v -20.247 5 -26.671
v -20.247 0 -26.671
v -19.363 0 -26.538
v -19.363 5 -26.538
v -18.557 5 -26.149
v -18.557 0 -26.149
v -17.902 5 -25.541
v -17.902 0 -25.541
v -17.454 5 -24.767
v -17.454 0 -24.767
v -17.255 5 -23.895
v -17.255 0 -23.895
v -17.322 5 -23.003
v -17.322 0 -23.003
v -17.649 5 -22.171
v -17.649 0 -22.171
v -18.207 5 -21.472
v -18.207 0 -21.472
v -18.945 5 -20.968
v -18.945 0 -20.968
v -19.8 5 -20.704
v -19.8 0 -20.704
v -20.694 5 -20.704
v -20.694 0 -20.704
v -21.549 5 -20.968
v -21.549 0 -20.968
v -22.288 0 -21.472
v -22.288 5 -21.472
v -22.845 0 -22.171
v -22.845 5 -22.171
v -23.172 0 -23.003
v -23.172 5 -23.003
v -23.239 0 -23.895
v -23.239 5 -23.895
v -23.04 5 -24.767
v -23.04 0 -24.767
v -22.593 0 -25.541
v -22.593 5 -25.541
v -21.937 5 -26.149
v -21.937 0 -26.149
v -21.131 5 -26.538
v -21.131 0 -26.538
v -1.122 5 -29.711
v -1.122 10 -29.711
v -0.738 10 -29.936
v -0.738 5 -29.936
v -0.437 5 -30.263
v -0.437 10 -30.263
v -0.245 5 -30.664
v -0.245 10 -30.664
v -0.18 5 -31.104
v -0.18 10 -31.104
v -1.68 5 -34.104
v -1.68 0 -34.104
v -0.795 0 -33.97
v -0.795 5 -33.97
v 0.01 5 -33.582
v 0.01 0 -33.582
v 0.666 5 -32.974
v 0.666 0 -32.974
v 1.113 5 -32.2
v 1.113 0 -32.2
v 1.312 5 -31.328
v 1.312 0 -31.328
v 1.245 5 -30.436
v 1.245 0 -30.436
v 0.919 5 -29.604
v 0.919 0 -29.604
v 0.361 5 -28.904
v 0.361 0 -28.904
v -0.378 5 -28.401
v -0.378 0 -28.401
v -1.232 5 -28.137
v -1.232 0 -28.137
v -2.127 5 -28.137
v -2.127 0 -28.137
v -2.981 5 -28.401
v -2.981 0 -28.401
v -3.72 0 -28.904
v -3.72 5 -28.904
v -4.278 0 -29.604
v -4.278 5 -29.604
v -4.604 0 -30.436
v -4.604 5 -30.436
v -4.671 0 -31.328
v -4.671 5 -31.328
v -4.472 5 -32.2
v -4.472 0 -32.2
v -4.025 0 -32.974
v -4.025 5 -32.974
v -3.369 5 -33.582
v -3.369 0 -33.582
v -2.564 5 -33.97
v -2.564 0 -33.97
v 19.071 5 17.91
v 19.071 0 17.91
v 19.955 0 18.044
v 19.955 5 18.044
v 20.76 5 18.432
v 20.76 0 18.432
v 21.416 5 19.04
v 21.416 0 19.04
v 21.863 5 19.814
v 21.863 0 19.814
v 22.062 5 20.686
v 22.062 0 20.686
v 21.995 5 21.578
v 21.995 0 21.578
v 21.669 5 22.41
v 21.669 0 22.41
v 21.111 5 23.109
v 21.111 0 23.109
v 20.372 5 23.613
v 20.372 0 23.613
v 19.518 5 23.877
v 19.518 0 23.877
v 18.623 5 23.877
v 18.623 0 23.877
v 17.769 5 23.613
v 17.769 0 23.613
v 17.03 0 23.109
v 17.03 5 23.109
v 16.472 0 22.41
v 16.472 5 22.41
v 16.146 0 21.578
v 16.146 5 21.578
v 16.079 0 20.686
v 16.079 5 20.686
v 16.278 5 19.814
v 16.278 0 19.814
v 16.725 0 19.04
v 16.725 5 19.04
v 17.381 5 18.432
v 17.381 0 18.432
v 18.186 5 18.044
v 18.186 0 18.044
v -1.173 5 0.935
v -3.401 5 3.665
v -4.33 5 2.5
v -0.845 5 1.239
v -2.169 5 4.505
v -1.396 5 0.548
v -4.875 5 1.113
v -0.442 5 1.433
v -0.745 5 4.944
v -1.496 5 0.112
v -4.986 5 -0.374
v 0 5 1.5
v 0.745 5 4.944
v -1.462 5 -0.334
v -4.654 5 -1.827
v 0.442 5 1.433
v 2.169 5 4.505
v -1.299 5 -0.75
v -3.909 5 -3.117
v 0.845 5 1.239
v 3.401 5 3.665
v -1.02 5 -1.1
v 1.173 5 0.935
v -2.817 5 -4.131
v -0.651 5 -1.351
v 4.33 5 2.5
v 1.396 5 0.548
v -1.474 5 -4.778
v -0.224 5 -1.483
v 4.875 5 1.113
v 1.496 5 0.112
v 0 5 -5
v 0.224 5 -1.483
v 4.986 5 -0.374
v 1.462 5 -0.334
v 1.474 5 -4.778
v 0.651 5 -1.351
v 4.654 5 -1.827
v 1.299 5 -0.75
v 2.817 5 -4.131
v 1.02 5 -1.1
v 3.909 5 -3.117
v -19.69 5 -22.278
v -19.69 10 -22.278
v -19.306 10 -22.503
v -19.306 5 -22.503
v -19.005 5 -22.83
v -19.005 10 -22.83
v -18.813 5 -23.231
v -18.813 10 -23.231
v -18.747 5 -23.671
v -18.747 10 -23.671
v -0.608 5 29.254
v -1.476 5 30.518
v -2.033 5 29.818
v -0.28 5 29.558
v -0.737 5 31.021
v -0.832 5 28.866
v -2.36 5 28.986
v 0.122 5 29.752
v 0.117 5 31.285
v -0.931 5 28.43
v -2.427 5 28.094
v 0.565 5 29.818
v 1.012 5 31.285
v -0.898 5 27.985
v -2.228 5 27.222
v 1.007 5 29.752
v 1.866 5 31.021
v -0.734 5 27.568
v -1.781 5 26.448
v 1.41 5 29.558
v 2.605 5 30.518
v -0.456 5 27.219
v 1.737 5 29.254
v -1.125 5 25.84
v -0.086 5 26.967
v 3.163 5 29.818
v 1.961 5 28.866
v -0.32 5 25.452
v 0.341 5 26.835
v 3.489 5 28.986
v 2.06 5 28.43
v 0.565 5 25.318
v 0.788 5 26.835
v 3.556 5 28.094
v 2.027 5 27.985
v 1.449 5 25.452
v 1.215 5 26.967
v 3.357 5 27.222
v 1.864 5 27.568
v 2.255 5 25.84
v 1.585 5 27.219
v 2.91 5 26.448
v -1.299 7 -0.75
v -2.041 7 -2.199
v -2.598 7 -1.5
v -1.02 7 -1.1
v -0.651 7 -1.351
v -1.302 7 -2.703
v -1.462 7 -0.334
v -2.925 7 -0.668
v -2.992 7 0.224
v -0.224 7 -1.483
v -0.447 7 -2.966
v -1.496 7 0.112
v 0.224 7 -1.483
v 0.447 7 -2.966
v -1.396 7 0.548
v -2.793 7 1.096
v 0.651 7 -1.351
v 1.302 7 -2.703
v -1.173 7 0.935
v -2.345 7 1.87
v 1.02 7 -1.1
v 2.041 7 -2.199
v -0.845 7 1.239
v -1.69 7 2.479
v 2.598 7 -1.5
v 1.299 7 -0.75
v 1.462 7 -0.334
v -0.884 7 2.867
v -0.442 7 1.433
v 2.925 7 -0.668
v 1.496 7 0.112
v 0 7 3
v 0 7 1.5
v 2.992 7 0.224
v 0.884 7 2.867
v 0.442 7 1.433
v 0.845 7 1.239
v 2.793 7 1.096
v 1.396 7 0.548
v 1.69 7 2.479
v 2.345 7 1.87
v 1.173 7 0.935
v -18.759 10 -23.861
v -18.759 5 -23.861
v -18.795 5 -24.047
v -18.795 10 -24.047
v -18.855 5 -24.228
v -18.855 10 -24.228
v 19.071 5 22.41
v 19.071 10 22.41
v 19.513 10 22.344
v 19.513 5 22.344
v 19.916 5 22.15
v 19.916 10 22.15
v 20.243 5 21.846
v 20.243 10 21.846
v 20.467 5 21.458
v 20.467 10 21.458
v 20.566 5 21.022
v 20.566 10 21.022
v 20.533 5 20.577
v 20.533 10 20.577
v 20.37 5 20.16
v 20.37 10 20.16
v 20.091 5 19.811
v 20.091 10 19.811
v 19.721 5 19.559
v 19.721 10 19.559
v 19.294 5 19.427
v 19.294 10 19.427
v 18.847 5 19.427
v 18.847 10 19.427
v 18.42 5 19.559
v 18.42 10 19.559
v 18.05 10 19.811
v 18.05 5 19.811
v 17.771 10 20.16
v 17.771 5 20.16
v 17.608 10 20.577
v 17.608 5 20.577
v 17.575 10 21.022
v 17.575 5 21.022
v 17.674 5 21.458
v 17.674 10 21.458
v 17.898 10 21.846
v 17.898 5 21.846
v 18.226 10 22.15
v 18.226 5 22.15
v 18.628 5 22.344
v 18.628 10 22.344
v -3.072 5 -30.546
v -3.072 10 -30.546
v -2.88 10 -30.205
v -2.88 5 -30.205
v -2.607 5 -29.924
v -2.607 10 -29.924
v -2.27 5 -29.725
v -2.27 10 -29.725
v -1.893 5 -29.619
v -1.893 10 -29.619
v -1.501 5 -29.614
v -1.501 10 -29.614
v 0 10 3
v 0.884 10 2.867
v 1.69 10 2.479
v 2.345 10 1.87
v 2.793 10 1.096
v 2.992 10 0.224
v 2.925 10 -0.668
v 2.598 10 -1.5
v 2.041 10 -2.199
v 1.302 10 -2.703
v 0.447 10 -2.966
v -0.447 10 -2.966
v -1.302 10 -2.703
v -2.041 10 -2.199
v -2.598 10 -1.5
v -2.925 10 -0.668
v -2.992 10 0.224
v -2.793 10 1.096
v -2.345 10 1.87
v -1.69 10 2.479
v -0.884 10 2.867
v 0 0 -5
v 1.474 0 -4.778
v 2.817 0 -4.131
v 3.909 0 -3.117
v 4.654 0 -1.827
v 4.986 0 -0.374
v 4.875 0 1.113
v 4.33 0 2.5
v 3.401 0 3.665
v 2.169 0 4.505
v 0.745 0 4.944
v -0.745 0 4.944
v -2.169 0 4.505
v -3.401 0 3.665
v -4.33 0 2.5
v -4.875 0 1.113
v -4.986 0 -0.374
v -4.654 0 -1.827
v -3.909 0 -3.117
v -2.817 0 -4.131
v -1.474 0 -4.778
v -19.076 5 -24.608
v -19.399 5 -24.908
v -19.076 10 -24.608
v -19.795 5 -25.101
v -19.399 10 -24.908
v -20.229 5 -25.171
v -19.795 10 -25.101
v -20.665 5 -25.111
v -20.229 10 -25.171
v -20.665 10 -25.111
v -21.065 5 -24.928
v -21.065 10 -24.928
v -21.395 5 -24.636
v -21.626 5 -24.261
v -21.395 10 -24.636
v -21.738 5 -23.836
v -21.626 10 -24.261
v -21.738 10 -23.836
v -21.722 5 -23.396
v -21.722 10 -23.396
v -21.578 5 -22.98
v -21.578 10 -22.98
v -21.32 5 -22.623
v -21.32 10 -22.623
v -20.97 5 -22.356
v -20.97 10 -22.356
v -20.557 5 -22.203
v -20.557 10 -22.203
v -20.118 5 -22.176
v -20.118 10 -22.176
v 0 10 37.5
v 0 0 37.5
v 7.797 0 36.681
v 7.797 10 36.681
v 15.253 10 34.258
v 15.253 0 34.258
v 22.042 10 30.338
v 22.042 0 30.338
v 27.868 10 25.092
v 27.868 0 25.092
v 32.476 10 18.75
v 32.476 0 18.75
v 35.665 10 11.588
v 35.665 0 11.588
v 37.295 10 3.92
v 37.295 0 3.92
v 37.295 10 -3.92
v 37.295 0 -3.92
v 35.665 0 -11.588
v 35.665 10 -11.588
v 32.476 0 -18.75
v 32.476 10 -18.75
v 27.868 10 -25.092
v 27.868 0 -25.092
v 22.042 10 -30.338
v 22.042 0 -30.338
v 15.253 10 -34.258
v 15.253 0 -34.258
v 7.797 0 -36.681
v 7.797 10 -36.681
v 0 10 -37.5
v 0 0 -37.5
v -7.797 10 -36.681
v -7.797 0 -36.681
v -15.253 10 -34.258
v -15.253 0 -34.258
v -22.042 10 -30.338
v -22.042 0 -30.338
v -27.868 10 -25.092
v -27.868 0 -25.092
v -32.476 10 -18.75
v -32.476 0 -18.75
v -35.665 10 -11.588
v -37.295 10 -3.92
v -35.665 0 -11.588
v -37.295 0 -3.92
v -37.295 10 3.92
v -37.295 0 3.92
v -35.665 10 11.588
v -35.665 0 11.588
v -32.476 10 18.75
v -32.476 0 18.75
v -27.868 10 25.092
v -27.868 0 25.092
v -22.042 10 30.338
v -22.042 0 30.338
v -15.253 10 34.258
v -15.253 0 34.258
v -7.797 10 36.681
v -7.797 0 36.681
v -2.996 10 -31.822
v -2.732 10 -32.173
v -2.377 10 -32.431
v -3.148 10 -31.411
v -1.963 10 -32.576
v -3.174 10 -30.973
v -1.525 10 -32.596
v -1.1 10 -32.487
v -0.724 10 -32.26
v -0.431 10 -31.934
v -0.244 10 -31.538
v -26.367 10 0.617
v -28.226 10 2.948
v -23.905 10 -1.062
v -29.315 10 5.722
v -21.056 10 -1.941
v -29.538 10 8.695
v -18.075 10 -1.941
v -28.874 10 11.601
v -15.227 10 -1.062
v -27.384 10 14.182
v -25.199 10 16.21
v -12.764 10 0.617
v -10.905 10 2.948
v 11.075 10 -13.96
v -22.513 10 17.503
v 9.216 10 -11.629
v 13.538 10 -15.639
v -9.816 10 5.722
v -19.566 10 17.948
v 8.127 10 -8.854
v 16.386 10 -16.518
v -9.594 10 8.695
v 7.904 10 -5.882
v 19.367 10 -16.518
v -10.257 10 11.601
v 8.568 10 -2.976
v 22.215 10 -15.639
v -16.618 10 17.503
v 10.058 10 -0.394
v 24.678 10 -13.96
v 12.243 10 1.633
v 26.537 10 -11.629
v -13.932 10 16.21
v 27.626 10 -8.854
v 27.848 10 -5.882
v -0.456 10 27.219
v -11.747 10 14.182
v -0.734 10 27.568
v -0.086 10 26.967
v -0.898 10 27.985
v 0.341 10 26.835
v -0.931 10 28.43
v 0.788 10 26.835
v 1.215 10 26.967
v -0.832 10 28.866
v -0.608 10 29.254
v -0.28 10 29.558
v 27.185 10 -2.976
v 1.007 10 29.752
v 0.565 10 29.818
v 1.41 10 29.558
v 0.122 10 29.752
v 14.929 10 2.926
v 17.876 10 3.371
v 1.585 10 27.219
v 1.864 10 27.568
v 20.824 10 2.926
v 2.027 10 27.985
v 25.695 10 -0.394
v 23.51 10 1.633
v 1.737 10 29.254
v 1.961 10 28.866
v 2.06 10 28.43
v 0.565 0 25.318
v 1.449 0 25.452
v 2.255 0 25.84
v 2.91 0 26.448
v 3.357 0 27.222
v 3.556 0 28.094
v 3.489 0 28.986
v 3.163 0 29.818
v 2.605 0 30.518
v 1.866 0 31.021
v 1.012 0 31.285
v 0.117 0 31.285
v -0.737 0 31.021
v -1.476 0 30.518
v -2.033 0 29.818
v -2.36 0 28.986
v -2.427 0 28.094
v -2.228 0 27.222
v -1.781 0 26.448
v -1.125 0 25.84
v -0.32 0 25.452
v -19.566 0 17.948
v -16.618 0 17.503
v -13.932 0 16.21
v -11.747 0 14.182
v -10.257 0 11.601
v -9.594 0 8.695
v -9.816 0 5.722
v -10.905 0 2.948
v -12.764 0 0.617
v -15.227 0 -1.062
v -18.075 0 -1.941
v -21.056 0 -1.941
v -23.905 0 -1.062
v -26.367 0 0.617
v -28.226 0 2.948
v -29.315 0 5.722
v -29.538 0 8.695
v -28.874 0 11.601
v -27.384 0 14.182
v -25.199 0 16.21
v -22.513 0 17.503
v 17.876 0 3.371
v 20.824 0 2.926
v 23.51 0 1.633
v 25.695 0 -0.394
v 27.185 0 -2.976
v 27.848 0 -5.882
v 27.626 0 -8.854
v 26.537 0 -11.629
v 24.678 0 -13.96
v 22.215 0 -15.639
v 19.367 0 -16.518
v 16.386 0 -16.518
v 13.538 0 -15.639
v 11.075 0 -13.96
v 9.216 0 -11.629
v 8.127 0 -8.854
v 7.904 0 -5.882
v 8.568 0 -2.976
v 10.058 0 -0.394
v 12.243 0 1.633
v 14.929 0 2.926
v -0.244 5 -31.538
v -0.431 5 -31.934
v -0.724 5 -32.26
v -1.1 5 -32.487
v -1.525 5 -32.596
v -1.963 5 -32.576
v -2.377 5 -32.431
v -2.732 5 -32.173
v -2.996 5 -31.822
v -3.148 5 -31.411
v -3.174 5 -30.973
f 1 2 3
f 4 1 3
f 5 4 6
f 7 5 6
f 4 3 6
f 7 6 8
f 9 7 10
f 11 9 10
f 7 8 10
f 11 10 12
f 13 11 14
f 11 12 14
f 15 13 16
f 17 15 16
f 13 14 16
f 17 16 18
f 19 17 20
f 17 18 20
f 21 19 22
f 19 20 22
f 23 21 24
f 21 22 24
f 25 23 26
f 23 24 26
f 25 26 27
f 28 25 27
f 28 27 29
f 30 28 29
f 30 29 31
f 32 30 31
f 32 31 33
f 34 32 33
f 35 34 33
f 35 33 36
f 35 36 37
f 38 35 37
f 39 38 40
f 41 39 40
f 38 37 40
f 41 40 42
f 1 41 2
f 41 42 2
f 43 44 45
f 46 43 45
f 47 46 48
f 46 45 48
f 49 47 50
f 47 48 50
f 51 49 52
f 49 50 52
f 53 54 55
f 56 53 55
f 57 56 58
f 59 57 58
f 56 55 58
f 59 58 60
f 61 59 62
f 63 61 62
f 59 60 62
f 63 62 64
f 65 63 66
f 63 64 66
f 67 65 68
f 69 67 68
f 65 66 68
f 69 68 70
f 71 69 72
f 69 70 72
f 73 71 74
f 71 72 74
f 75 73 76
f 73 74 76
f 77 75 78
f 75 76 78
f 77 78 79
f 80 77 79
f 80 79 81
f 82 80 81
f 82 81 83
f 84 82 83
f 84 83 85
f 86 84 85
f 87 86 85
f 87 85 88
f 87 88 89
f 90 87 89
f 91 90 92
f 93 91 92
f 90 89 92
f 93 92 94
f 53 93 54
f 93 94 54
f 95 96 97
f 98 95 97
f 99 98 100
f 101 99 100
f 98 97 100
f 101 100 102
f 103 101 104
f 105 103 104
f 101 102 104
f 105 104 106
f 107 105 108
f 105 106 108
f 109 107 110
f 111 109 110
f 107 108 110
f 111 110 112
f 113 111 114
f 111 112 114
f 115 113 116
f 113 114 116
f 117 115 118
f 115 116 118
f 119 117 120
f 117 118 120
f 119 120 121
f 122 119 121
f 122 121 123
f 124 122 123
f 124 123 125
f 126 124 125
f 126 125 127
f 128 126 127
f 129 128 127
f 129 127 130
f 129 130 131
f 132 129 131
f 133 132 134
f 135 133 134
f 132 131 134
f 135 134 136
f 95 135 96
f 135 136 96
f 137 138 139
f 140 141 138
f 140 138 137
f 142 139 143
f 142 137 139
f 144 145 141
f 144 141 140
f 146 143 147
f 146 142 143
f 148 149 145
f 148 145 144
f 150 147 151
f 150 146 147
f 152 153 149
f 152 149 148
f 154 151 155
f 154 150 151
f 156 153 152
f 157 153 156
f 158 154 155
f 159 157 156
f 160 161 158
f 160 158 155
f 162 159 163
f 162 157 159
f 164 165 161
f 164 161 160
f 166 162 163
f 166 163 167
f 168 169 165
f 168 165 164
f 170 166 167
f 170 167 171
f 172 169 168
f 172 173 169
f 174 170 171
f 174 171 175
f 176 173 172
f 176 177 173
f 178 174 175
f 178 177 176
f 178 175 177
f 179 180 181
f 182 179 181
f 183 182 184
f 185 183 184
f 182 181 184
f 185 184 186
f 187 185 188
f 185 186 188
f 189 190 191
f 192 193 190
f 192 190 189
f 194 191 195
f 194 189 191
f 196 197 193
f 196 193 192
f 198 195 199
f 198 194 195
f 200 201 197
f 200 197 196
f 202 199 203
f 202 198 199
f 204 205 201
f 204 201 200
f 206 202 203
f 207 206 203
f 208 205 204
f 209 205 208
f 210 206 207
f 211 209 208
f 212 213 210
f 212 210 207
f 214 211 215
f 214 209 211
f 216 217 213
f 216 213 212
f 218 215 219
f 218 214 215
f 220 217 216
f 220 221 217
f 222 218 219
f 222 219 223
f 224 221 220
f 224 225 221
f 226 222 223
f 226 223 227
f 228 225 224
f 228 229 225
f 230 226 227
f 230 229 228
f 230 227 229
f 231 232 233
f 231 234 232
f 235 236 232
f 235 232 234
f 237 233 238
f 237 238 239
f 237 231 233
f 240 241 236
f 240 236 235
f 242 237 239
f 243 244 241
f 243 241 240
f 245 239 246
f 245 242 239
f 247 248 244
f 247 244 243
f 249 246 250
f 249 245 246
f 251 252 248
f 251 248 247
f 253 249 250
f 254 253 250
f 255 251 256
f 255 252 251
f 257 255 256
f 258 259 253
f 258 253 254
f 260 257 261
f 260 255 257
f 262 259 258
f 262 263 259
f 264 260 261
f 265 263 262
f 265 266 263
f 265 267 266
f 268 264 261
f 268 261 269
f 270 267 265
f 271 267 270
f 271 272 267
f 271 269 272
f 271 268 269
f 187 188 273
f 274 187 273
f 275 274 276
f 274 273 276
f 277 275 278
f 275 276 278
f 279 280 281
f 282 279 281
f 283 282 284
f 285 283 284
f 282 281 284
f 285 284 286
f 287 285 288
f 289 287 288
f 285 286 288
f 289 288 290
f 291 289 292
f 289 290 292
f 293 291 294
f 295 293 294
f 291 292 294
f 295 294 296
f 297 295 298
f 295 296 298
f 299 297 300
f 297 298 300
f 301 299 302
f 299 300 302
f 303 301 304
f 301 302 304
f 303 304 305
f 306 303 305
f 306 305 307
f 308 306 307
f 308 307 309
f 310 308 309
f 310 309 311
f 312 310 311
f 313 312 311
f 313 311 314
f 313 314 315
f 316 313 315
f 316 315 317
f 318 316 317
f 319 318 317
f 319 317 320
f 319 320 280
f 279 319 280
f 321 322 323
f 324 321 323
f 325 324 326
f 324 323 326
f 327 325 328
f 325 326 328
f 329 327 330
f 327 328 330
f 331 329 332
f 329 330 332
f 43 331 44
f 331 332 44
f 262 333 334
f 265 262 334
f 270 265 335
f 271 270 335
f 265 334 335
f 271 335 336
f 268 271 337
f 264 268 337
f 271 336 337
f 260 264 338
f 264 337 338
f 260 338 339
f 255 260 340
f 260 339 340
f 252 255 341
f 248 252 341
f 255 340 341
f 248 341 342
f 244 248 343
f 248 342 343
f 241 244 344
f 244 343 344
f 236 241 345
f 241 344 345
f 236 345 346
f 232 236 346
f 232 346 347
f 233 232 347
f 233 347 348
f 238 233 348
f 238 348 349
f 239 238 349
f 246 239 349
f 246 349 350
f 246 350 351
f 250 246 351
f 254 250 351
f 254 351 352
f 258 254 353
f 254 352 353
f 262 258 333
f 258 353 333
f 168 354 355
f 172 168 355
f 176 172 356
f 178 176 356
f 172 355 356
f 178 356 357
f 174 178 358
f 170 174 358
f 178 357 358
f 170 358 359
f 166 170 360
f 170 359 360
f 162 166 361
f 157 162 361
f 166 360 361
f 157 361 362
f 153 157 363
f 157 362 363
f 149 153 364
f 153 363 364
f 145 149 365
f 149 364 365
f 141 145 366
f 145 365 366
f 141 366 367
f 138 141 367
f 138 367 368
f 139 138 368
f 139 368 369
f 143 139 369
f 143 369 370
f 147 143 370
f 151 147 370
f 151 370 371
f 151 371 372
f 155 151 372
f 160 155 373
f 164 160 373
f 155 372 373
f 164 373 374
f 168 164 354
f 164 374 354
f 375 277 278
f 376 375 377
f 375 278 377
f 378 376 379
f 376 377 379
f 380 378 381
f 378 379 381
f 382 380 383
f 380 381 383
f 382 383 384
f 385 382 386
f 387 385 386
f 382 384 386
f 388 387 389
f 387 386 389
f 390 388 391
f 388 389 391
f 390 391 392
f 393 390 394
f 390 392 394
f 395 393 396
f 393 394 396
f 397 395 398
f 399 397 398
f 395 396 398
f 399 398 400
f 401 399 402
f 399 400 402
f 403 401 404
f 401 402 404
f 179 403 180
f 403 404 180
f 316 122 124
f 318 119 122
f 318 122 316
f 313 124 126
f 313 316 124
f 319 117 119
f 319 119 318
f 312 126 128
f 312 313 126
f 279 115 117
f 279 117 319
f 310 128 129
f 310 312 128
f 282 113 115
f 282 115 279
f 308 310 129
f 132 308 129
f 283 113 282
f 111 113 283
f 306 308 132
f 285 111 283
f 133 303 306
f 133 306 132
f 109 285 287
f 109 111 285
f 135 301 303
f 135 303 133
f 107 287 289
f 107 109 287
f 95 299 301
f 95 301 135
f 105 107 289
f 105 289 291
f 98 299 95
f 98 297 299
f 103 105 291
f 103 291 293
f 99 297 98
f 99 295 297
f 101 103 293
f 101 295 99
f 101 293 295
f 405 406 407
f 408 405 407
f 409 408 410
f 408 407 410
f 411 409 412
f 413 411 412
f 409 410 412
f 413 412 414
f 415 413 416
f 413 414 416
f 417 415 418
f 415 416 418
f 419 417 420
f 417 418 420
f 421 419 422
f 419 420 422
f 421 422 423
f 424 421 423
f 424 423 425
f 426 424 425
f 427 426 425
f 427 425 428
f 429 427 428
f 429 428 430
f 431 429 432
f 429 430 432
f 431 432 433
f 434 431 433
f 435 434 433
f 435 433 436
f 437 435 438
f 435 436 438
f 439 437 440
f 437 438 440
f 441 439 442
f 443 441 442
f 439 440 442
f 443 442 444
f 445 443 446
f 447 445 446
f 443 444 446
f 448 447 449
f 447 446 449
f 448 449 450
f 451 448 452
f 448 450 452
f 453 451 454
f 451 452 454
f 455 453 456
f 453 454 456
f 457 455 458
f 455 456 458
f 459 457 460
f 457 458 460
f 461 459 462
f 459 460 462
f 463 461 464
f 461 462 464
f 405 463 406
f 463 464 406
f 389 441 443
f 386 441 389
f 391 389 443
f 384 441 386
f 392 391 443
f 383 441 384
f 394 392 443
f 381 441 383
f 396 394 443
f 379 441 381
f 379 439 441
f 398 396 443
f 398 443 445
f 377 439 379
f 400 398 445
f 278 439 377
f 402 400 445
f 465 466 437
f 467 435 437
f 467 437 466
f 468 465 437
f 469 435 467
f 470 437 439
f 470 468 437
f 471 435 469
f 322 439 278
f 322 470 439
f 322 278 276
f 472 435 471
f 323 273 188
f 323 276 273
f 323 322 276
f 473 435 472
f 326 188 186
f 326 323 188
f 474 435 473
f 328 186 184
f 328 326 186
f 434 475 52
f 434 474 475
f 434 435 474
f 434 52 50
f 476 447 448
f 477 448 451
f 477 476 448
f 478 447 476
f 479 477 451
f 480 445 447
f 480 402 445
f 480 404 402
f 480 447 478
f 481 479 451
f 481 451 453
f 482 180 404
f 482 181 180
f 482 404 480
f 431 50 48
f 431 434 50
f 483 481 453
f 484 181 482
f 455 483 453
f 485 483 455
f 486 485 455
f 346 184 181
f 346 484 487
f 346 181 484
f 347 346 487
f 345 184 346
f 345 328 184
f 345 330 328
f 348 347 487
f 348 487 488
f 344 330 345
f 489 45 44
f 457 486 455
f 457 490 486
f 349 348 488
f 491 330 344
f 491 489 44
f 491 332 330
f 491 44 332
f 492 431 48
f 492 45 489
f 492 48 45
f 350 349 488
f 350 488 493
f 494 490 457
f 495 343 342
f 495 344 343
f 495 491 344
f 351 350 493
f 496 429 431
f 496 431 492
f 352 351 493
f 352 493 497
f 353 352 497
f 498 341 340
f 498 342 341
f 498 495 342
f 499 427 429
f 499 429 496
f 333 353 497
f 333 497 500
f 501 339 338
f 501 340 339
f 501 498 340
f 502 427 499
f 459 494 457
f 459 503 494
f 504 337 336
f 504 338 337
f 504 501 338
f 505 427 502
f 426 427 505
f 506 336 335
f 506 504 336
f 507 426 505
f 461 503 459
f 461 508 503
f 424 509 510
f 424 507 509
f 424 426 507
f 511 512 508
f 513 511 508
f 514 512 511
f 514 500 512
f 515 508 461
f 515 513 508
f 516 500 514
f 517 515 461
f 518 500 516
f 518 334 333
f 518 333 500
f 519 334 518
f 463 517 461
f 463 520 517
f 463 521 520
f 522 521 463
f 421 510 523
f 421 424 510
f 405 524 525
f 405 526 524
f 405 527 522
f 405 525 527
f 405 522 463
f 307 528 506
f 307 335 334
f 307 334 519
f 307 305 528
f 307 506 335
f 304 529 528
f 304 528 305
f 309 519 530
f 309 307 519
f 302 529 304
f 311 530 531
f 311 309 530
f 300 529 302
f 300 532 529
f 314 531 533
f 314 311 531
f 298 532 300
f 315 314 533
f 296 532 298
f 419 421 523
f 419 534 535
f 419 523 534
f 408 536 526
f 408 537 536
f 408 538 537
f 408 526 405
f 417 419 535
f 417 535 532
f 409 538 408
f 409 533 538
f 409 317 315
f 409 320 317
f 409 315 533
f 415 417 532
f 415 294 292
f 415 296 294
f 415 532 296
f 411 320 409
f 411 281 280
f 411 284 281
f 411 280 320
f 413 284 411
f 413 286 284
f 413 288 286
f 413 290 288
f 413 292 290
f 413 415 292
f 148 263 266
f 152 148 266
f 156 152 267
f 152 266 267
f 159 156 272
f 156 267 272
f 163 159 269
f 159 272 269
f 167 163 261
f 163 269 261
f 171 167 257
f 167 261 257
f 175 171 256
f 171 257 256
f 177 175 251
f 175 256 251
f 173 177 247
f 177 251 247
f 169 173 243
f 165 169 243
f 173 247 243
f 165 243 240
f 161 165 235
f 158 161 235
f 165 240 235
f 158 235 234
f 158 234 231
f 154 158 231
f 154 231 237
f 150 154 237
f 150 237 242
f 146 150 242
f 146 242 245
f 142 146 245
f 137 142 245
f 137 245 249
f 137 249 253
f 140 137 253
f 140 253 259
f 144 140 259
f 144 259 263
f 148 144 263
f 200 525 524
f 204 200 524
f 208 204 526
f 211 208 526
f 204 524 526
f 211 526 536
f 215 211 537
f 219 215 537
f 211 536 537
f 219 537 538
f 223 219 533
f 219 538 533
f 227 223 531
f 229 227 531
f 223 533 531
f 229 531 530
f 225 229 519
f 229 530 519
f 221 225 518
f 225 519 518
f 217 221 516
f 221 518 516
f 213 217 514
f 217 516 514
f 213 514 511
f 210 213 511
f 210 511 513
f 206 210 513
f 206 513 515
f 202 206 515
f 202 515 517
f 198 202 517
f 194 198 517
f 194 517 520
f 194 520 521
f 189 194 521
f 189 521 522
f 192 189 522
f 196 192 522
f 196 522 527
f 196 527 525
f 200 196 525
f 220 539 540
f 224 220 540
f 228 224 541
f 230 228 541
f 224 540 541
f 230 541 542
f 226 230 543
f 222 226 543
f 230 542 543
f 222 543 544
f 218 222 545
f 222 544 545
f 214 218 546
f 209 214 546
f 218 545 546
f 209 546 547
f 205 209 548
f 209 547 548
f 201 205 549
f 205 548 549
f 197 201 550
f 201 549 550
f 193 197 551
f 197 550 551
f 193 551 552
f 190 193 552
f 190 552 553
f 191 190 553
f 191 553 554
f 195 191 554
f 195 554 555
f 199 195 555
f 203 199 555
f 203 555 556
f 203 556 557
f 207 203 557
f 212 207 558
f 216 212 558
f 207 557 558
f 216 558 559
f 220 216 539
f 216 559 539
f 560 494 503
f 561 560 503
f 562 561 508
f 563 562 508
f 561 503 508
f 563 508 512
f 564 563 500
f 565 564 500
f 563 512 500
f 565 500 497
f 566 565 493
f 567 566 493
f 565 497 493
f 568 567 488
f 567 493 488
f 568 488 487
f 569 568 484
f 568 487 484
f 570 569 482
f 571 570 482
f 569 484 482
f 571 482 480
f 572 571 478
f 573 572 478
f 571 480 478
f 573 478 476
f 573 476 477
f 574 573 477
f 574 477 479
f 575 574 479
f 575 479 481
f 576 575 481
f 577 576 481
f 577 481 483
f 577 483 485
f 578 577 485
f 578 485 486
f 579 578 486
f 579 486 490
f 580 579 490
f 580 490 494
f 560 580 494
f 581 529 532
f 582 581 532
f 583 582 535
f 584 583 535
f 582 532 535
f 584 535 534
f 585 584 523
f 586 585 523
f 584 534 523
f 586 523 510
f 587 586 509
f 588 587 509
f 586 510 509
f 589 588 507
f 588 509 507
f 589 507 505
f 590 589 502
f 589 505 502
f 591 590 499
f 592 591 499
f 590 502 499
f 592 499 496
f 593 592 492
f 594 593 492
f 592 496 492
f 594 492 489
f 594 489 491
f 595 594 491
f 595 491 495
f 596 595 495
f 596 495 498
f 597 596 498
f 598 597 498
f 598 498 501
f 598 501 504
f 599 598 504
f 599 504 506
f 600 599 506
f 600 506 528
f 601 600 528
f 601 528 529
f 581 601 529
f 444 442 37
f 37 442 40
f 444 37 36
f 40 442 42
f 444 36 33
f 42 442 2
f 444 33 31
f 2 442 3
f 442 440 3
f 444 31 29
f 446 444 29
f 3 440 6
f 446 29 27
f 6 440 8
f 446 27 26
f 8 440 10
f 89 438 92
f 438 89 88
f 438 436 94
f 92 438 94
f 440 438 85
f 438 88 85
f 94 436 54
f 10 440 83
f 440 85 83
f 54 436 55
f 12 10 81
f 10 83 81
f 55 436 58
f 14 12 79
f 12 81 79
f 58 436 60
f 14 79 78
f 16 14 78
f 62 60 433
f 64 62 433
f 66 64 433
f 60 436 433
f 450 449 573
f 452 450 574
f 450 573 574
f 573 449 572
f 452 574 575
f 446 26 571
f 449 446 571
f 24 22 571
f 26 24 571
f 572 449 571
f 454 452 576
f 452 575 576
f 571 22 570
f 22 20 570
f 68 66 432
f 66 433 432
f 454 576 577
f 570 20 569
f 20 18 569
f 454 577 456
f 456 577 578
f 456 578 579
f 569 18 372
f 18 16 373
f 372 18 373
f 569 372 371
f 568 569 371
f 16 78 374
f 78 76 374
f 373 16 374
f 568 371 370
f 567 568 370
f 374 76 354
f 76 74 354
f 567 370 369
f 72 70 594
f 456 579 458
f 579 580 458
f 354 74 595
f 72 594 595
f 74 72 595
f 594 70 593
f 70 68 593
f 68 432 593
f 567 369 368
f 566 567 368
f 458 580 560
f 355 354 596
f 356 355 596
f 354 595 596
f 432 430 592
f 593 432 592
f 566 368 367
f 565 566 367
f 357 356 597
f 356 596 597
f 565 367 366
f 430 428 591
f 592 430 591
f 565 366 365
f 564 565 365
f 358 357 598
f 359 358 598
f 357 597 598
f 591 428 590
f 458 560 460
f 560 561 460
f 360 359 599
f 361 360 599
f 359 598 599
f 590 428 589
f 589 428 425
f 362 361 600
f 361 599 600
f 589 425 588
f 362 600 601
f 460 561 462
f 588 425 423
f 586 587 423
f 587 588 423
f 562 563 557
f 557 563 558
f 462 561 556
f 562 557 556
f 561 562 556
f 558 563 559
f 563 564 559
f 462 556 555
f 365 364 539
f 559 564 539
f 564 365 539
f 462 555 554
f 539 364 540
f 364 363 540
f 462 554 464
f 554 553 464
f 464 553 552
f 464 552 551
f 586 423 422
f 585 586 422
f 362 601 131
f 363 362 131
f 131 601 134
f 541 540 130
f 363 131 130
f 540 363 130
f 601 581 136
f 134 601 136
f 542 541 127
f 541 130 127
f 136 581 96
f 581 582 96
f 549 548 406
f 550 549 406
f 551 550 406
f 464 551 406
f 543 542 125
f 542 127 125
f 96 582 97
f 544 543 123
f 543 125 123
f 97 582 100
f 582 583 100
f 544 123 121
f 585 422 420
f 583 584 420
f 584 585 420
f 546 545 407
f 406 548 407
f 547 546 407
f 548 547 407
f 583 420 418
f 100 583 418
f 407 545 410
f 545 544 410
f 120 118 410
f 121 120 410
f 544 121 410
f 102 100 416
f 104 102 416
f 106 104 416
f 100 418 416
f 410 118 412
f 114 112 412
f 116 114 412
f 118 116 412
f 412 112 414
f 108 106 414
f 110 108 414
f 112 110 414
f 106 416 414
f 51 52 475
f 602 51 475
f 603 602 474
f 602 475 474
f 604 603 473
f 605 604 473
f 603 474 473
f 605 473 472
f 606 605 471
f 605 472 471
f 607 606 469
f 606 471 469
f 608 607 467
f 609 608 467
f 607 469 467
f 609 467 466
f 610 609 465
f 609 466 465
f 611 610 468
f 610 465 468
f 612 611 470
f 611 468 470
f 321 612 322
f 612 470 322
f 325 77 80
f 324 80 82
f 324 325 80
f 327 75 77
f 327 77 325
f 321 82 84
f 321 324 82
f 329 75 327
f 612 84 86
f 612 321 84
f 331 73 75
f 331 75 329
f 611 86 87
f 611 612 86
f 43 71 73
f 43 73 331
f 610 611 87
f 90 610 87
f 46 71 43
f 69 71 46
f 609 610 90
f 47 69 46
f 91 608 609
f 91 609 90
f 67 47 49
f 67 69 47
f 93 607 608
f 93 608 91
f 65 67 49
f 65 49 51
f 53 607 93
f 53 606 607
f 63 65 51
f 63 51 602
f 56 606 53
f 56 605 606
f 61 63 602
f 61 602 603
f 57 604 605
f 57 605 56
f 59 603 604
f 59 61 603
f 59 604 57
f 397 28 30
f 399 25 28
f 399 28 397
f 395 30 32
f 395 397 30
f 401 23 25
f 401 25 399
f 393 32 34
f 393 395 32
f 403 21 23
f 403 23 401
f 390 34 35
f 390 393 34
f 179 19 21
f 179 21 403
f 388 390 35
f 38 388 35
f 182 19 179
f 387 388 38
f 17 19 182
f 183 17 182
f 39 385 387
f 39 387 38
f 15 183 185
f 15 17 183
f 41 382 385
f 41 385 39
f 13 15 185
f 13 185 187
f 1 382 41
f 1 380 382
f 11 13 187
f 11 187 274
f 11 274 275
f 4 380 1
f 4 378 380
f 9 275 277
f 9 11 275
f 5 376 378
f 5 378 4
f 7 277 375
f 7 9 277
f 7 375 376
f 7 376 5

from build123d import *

# Parameters (mm, degrees)
SKETCH1_R           = 37.5
BOSS_EXTRUDE1_DEPTH = 10
SKETCH3_R           = 1.5
CUT_EXTRUDE3_DEPTH  = 54.967582862
SKETCH4_R           = 5
CUT_EXTRUDE4_DEPTH  = 5
SKETCH5_R           = 1.5
CUT_EXTRUDE5_DEPTH  = 54.967582862
SKETCH6_R           = 3
CUT_EXTRUDE6_DEPTH  = 5
SKETCH8_R           = 3
CUT_EXTRUDE7_DEPTH  = 3
SKETCH9_R           = 10
CUT_EXTRUDE8_DEPTH  = 54.967582862


with BuildPart() as part:
    # Sketch1 → Boss-Extrude1 (new body)
    with BuildSketch(Plane(origin=(0, 0, 0), x_dir=(1, 0, 0), z_dir=(0, 1, 0))):
        with Locations(Location((0, 0, 0), (0, 0, 270))):
            Circle(SKETCH1_R)
    extrude(amount=BOSS_EXTRUDE1_DEPTH)

    # Sketch3 → Cut-Extrude3 (cut, through all)
    with BuildSketch(Plane(origin=(0, 10, 0), x_dir=(1, 0, 0), z_dir=(0, 1, 0))):
        with Locations(Location((0, 0, 0), (0, 0, 270))):
            Circle(SKETCH3_R)
    extrude(amount=-CUT_EXTRUDE3_DEPTH, mode=Mode.SUBTRACT)

    # Sketch4 → Cut-Extrude4 (cut)
    with BuildSketch(Plane.XZ):
        with Locations(Location((0, 0, 0), (0, 0, 270))):
            Circle(SKETCH4_R)
    extrude(amount=-CUT_EXTRUDE4_DEPTH, mode=Mode.SUBTRACT)

    # Sketch5 → Cut-Extrude5 (cut, through all)
    with BuildSketch(Plane(origin=(0, 10, 0), x_dir=(1, 0, 0), z_dir=(0, 1, 0))):
        with BuildLine():
            ThreePointArc((-18.854509148, 24.228237343), (-21.625950603, 24.261294568), (-19.689620544, 22.278214534))
            Line((-19.689620544, 22.278214534), (-20.247076251, 23.670781637))
            Line((-20.247076251, 23.670781637), (-18.854509148, 24.228237343))
        make_face()
        with BuildLine():
            Line((-20.247076251, 23.670781637), (-19.689620544, 22.278214534))
            ThreePointArc((-19.689620544, 22.278214534), (-19.004863797, 22.830003295), (-18.747076251, 23.670781637))
            ThreePointArc((-18.747076251, 23.670781637), (-18.774179334, 23.954638419), (-18.854509148, 24.228237343))
            Line((-18.854509148, 24.228237343), (-20.247076251, 23.670781637))
        make_face()
        with BuildLine():
            ThreePointArc((-3.072081987, 30.546068688), (-2.270027815, 29.724650042), (-1.122059178, 29.710957292))
            Line((-1.122059178, 29.710957292), (-1.679514884, 31.103524394))
            Line((-1.679514884, 31.103524394), (-3.072081987, 30.546068688))
        make_face()
        with BuildLine():
            Line((-1.679514884, 31.103524394), (-1.122059178, 29.710957292))
            ThreePointArc((-1.122059178, 29.710957292), (-0.437302431, 30.262746053), (-0.179514884, 31.103524394))
            ThreePointArc((-0.179514884, 31.103524394), (-1.963371667, 32.576421311), (-3.072081987, 30.546068688))
            Line((-3.072081987, 30.546068688), (-1.679514884, 31.103524394))
        make_face()
        with Locations(Location((19.070534713, -20.910318461, 0), (0, 0, 270))):
            Circle(SKETCH5_R)
        with Locations(Location((0.564603471, -28.318390189, 0), (0, 0, 270))):
            Circle(SKETCH5_R)
    extrude(amount=-CUT_EXTRUDE5_DEPTH, mode=Mode.SUBTRACT)

    # Sketch6 → Cut-Extrude6 (cut)
    with BuildSketch(Plane.XZ):
        with Locations(Location((19.070534713, 20.910318461, 0), (0, 0, 270))):
            Circle(SKETCH6_R)
        with Locations(Location((0.564603471, 28.318390189, 0), (0, 0, 270))):
            Circle(SKETCH6_R)
        with Locations(Location((-1.679514884, -31.103524394, 0), (0, 0, 270))):
            Circle(SKETCH6_R)
        with Locations(Location((-20.247076251, -23.670781637, 0), (0, 0, 270))):
            Circle(SKETCH6_R)
    extrude(amount=-CUT_EXTRUDE6_DEPTH, mode=Mode.SUBTRACT)

    # Sketch8 → Cut-Extrude7 (cut)
    with BuildSketch(Plane(origin=(0, 10, 0), x_dir=(1, 0, 0), z_dir=(0, 1, 0))):
        with Locations(Location((0, 0, 0), (0, 0, 270))):
            Circle(SKETCH8_R)
    extrude(amount=-CUT_EXTRUDE7_DEPTH, mode=Mode.SUBTRACT)

    # Sketch9 → Cut-Extrude8 (cut, through all)
    with BuildSketch(Plane(origin=(0, 10, 0), x_dir=(1, 0, 0), z_dir=(0, 1, 0))):
        with Locations(Location((17.876448336, 6.629278922, 0), (0, 0, 270))):
            Circle(SKETCH9_R)
        with Locations(Location((-19.565700474, -7.94754173, 0), (0, 0, 270))):
            Circle(SKETCH9_R)
    extrude(amount=-CUT_EXTRUDE8_DEPTH, mode=Mode.SUBTRACT)


solid = part.part
